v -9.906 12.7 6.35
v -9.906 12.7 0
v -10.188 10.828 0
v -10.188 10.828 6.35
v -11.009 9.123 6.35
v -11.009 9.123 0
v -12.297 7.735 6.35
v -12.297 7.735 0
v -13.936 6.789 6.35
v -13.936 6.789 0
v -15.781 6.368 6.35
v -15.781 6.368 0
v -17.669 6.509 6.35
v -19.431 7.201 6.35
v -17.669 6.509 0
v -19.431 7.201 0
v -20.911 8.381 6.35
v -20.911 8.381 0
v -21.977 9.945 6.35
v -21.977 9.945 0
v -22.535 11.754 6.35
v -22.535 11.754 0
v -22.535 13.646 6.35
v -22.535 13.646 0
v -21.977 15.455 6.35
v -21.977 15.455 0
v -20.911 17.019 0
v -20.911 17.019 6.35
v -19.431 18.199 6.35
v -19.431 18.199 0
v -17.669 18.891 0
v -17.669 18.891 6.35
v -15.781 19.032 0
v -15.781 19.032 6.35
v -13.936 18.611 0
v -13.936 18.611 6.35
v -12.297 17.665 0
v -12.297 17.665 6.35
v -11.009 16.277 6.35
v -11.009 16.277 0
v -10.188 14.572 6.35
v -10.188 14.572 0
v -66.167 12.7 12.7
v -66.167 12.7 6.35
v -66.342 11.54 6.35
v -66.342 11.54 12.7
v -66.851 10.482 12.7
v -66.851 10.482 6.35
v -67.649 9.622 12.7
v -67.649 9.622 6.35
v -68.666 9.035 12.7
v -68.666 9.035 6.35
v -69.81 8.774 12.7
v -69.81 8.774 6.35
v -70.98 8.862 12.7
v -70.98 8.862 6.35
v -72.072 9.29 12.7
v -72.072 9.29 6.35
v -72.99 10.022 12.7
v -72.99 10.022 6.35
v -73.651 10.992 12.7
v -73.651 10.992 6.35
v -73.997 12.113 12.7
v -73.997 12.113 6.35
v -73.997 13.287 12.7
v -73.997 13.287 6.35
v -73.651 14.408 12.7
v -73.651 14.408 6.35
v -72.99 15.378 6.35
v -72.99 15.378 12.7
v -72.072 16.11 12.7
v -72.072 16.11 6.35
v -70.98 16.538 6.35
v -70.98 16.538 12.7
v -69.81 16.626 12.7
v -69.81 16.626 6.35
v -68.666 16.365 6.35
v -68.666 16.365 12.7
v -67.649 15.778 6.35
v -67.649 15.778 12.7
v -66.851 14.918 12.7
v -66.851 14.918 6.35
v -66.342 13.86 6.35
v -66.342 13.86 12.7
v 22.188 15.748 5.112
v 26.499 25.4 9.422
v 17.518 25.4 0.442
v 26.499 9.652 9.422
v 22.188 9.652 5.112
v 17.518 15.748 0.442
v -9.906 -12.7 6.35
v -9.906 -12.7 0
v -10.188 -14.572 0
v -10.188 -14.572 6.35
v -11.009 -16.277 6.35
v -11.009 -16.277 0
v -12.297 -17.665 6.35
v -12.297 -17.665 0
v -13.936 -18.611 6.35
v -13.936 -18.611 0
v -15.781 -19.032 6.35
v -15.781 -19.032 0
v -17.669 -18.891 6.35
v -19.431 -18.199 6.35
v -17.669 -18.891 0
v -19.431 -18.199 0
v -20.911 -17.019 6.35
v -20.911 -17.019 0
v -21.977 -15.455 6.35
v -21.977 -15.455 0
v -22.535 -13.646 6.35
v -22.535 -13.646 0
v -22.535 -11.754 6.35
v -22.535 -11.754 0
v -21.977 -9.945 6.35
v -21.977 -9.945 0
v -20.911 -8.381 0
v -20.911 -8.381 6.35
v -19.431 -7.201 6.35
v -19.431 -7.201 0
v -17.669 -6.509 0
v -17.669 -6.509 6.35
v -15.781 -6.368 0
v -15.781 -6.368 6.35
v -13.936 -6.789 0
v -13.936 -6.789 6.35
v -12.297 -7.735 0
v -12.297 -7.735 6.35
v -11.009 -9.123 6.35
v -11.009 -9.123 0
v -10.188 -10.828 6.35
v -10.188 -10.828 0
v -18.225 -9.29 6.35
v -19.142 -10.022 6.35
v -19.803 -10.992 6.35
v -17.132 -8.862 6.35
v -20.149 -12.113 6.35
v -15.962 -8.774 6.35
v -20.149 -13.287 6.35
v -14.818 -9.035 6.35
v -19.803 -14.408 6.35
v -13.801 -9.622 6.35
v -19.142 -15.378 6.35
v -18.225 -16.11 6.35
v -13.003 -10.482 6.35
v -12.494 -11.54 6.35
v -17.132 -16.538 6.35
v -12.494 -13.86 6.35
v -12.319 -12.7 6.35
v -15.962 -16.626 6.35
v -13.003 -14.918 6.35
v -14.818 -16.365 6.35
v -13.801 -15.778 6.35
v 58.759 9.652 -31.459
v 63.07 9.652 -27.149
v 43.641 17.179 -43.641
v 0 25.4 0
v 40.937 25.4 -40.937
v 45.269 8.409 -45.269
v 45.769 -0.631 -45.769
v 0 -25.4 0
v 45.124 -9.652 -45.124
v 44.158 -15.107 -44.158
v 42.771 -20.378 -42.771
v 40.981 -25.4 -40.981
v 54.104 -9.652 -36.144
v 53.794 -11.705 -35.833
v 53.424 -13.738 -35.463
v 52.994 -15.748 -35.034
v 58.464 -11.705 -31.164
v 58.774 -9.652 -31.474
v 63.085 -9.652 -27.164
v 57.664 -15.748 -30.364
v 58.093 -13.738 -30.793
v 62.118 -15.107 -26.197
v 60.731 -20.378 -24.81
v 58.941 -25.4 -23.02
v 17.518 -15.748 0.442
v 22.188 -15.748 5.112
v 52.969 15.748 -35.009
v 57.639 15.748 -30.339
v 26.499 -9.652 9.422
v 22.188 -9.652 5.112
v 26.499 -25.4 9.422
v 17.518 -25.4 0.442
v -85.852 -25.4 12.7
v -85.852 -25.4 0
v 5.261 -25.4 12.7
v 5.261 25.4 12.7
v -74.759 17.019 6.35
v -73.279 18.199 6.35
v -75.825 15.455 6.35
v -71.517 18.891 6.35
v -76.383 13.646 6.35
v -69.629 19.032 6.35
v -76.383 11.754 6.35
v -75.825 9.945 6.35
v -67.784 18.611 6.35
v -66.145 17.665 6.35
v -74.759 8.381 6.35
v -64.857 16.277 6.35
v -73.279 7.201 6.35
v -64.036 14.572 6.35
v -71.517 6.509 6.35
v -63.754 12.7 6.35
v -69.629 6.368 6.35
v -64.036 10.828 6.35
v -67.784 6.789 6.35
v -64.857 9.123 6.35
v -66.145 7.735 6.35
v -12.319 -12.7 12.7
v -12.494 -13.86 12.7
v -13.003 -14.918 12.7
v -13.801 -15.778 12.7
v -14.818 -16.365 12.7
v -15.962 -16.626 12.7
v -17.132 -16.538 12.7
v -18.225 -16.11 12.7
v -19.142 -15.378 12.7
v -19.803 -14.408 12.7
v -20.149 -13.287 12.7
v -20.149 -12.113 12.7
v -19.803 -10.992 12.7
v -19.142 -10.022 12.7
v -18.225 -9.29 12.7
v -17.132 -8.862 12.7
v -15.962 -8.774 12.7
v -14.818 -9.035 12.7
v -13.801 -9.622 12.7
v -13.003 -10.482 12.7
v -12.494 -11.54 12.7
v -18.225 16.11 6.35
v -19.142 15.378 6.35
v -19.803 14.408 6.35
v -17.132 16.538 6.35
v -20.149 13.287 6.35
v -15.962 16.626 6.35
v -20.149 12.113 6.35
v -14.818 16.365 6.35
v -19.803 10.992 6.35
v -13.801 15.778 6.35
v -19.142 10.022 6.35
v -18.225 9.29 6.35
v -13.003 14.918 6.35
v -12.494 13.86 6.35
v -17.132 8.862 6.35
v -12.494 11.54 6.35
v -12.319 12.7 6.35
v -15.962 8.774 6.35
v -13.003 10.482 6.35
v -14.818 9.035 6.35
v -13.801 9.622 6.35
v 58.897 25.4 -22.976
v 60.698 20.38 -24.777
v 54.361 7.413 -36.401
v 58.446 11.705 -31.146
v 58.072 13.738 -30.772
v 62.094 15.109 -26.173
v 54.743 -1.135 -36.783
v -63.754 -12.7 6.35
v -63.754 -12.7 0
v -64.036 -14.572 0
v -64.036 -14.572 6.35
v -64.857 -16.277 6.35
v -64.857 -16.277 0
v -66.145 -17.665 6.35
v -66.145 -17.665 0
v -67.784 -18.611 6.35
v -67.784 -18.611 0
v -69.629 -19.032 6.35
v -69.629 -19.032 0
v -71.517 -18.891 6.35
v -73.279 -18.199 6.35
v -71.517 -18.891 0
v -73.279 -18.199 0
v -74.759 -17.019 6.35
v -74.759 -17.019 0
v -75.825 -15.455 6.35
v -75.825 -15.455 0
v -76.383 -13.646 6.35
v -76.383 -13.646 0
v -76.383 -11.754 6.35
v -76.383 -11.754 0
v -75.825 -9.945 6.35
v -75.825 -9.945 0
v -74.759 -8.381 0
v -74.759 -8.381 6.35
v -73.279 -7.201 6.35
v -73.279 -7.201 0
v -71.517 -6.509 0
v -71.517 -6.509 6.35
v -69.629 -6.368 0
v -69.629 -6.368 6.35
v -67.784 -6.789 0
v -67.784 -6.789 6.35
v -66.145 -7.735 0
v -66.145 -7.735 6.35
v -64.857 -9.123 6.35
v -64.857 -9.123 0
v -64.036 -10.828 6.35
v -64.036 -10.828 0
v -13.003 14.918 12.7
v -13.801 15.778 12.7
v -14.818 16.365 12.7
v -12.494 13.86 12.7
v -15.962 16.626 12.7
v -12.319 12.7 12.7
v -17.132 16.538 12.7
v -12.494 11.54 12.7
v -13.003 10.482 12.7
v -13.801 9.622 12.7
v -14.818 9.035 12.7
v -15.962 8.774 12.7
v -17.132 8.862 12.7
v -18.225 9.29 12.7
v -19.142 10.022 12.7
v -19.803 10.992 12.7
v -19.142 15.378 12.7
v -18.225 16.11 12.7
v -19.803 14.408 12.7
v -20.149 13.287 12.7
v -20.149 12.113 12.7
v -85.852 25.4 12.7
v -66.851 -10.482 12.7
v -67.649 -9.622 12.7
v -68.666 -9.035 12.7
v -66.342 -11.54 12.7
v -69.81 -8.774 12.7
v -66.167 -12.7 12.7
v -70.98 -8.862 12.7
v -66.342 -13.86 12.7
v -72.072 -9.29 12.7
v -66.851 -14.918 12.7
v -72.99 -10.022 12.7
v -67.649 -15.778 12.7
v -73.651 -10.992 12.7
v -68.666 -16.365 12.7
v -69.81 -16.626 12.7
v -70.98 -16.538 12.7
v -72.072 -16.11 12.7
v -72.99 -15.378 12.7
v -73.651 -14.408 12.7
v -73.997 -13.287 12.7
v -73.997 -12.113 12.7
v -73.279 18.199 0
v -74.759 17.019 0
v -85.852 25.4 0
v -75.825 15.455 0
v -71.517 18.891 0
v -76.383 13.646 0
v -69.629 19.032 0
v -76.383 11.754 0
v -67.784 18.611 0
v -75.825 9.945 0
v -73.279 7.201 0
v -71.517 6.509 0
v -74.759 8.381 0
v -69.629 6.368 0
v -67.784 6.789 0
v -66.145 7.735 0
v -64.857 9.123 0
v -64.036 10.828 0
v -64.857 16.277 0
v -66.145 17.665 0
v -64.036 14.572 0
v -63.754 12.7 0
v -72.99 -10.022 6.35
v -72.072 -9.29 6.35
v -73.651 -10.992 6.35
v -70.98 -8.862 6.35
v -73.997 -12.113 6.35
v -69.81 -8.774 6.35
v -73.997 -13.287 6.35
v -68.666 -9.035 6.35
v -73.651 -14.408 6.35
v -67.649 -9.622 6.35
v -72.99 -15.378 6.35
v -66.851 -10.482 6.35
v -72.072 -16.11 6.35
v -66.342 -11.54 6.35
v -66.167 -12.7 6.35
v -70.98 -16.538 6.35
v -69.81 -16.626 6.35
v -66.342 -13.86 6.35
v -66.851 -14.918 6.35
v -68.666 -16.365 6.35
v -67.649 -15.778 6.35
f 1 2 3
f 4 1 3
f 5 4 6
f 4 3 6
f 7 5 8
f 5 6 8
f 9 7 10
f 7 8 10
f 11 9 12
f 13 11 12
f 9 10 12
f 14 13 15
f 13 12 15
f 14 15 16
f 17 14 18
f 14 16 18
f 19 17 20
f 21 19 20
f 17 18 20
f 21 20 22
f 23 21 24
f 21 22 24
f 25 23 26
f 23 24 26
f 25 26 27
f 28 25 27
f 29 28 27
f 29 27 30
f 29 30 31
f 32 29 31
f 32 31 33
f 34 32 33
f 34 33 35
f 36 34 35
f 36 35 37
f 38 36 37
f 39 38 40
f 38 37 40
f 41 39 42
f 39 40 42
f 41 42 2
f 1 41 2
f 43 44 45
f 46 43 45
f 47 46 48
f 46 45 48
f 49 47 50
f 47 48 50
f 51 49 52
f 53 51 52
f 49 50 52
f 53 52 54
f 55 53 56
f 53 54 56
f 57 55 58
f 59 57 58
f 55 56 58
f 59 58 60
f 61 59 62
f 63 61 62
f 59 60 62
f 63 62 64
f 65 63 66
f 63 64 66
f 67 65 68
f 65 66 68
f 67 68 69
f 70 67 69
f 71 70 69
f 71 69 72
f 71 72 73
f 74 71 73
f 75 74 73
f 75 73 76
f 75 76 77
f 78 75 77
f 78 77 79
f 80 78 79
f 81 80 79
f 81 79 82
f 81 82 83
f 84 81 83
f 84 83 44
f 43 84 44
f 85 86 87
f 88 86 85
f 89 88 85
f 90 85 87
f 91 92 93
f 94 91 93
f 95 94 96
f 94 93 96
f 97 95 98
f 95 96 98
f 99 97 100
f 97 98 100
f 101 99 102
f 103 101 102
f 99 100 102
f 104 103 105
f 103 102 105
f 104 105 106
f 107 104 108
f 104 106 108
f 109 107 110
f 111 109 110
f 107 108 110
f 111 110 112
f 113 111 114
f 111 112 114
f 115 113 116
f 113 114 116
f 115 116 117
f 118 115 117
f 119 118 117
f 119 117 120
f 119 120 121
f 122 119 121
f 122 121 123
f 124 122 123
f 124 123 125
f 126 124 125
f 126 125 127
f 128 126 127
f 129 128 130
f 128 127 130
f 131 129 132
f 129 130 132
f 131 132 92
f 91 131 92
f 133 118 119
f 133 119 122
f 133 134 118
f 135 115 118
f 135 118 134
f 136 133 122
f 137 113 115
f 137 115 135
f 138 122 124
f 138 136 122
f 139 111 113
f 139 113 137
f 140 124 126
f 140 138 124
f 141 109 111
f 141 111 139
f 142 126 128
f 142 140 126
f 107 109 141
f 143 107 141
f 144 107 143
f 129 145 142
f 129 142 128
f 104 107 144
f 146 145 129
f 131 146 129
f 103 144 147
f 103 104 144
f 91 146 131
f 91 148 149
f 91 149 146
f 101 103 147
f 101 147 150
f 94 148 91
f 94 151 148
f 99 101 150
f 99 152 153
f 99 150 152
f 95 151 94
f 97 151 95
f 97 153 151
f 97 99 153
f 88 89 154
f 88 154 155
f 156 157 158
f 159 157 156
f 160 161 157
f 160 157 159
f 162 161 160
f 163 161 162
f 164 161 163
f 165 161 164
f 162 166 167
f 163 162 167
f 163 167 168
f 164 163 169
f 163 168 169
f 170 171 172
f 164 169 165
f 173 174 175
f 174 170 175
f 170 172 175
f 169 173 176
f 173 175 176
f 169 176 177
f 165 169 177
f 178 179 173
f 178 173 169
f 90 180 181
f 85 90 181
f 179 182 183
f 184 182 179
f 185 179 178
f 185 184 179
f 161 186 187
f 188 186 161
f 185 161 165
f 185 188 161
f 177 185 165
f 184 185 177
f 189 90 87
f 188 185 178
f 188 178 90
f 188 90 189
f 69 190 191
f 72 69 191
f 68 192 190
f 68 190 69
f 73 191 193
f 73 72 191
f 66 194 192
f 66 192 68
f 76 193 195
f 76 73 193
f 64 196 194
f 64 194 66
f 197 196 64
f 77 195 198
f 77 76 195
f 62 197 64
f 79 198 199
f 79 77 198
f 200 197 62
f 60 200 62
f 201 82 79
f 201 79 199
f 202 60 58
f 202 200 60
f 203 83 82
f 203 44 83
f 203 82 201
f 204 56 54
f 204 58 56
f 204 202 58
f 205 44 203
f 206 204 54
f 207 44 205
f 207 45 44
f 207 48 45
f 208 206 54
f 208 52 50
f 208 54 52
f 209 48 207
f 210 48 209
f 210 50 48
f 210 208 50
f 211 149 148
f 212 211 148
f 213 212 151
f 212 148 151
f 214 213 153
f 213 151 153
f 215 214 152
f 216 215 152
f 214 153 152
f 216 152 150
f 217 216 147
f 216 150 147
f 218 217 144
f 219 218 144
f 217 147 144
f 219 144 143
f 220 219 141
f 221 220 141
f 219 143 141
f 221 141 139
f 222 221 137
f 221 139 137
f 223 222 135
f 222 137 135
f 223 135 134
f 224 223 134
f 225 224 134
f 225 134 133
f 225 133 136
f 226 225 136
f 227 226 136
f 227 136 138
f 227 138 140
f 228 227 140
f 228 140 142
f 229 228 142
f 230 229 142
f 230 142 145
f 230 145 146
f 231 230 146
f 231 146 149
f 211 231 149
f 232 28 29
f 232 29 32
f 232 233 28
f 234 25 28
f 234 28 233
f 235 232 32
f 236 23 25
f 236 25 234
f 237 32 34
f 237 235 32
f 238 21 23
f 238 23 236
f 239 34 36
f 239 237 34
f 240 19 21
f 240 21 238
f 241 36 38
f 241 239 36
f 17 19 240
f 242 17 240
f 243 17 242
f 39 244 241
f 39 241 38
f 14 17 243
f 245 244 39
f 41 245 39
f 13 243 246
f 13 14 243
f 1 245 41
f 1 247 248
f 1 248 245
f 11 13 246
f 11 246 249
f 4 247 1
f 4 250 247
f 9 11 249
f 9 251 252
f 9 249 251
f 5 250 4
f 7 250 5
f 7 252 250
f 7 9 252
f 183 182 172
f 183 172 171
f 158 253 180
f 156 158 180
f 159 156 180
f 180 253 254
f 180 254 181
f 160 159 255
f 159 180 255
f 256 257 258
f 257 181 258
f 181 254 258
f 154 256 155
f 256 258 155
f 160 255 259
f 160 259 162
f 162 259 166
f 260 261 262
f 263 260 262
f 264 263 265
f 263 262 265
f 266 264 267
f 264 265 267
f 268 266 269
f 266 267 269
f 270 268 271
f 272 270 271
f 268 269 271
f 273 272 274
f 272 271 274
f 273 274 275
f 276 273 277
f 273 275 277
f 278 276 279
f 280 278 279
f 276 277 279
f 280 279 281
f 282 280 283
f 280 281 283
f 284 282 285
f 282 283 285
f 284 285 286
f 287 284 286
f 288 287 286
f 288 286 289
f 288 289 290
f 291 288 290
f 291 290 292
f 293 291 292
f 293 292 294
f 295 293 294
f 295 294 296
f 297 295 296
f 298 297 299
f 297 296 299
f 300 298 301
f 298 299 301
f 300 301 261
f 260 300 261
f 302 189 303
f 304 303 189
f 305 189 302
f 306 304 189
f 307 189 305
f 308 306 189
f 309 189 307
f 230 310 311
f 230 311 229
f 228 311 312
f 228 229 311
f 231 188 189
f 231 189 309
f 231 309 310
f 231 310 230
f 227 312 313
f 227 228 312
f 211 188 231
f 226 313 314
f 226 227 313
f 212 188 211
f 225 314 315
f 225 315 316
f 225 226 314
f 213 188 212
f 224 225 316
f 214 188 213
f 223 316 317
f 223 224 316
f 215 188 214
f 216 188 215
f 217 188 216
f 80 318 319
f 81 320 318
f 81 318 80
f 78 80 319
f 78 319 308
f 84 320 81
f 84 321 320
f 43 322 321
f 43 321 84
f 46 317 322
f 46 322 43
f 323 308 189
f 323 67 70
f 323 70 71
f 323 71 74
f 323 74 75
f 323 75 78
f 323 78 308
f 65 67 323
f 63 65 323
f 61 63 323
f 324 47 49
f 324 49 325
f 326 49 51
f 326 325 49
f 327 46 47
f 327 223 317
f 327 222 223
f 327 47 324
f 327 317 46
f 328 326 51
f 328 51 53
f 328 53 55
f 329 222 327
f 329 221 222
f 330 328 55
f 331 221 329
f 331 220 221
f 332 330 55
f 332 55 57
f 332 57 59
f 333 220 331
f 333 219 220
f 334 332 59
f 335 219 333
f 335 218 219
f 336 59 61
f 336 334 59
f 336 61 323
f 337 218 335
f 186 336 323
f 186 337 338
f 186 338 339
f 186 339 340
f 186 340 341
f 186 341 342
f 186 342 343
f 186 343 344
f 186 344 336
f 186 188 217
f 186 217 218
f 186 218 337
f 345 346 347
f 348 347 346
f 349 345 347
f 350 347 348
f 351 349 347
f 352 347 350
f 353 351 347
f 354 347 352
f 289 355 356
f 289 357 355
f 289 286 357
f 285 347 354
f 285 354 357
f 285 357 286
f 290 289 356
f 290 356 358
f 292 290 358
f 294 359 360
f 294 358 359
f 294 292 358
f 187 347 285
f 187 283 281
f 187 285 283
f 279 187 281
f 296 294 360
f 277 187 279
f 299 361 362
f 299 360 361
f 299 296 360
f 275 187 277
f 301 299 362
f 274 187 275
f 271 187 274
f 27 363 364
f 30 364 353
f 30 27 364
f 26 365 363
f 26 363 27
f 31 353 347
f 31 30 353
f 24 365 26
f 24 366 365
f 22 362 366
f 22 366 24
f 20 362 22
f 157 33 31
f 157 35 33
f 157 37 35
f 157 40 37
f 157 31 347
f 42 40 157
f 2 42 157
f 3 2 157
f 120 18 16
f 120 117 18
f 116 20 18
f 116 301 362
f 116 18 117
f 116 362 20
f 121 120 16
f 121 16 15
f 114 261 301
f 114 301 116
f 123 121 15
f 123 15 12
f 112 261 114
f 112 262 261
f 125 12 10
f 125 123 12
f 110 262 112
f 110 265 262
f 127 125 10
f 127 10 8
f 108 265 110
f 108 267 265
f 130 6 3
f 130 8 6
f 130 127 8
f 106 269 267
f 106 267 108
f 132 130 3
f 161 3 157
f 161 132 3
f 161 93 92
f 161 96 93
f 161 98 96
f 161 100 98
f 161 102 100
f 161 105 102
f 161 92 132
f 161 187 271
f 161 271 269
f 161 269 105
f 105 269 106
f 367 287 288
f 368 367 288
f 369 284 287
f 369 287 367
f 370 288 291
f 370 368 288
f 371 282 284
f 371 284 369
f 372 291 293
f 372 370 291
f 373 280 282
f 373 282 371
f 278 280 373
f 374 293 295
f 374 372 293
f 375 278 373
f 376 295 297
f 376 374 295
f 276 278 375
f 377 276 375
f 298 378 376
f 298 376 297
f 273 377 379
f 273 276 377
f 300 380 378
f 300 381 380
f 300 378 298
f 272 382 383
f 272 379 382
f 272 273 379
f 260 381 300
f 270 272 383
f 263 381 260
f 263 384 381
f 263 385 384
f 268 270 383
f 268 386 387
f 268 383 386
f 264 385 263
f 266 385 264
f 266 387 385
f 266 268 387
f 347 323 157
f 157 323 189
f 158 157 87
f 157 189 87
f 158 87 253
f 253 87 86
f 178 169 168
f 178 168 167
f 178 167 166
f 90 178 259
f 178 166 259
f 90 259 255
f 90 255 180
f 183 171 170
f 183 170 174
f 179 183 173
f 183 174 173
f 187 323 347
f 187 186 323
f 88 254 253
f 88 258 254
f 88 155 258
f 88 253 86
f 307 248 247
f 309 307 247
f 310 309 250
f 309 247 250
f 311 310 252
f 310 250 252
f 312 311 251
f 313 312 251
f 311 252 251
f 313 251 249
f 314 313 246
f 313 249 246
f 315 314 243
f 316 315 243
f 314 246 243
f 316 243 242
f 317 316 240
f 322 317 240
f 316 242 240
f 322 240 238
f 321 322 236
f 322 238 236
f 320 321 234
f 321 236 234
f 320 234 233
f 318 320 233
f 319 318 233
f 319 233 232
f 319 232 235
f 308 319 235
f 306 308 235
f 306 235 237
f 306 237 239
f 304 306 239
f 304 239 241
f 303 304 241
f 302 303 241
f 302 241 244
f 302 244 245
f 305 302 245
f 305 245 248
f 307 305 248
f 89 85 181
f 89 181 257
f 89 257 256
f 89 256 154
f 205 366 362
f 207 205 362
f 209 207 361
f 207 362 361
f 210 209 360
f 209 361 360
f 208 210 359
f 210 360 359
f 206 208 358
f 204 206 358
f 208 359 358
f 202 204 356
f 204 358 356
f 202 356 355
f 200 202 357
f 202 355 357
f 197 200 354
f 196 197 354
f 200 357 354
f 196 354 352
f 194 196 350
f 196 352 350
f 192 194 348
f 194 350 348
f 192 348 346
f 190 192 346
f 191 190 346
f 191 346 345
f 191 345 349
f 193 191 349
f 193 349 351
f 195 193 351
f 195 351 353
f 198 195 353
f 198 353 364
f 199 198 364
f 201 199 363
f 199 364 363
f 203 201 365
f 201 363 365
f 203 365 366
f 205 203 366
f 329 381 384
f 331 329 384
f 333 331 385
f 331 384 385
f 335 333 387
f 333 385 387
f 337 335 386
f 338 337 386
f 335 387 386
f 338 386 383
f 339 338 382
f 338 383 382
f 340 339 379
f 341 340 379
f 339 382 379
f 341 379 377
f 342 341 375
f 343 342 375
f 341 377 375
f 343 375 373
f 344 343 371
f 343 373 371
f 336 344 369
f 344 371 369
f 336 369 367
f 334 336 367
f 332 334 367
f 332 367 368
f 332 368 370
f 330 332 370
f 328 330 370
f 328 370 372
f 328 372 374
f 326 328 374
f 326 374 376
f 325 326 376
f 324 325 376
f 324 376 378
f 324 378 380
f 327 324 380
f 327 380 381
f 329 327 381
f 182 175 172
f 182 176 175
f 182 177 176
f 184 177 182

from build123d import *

# Parameters (mm, degrees)
F1_DEPTH = 25.4
F2_R     = 6.35
F3_DEPTH = 6.35
F4_R     = 3.937
F5_DEPTH = 25.4
F7_DEPTH = 52.7686600304
F9_DEPTH = 25.4


with BuildPart() as f1:
    # F0 (on Front) → F1 (new body, symmetric)
    with BuildSketch(Plane.XZ):
        Polygon((-85.852, 12.7), (-85.852, 0), (0, 0), (45.8512699094, -45.8512699094), (54.8315260304, -36.8710137883), (17.5184486888, 0.4420635534), (5.2605122421, 12.7), align=None)
        Polygon((26.4987048099, 9.4223196744), (17.5184486888, 0.4420635534), (54.8315260304, -36.8710137883), (63.8117821515, -27.8907576672), align=None)
    extrude(amount=F1_DEPTH, both=True)

    # F2 (on face) → F3 (cut)
    with BuildSketch(Plane(origin=(0, 0, 0), x_dir=(1, 0, 0), z_dir=(0, 0, -1))):
        with Locations((-70.104, 12.7)):
            Circle(F2_R)
        with Locations((-16.256, 12.7)):
            Circle(F2_R)
        with Locations((-16.256, -12.7)):
            Circle(F2_R)
        with Locations((-70.104, -12.7)):
            Circle(F2_R)
    extrude(amount=-F3_DEPTH, mode=Mode.SUBTRACT)

    # F4 (on face) → F5 (cut)
    with BuildSketch(Plane(origin=(0, 0, 0), x_dir=(1, 0, 0), z_dir=(0, 0, -1))):
        with Locations((-16.256, -12.7)):
            Circle(F4_R)
        with Locations((-16.256, 12.7)):
            Circle(F4_R)
        with Locations((-70.104, 12.7)):
            Circle(F4_R)
        with Locations((-70.104, -12.7)):
            Circle(F4_R)
    extrude(amount=-F5_DEPTH, mode=Mode.SUBTRACT)

    # F6 (on face) → F7 (cut, through all)
    with BuildSketch(Plane(origin=(45.8512699094, 0, -45.8512699094), x_dir=(0, 1, 0), z_dir=(0.7071067812, 0, -0.7071067812))):
        Polygon((9.652, 25.4), (-9.652, 25.4), (-9.652, 19.304), (-15.748, 19.304), (-15.748, 12.7), (15.748, 12.7), (15.748, 19.304), (9.652, 19.304), align=None)
    extrude(amount=-F7_DEPTH, mode=Mode.SUBTRACT)

    # F8 (on face) → F9 (cut, through all)
    with BuildSketch(Plane(origin=(17.9605122421, 0, 17.9605122421), x_dir=(0, 1, 0), z_dir=(0.7071067812, 0, 0.7071067812))):
        with BuildLine():
            ThreePointArc((-9.652, -63.8151974917), (-17.7699630745, -61.5408606446), (-25.4, -57.9552687705))
            Line((-25.4, -57.9552687705), (-25.4, -64.8434877579))
            Line((-25.4, -64.8434877579), (-9.652, -64.8434877579))
            Line((-9.652, -64.8434877579), (-9.652, -63.8151974917))
        make_face()
        with BuildLine():
            ThreePointArc((25.4, -57.89321661), (8.408914861, -64.0203496104), (-9.652, -63.8151974917))
            Line((-9.652, -63.8151974917), (-9.652, -64.8434877579))
            Line((-9.652, -64.8434877579), (1.0093030718, -64.8434877579))
            Line((1.0093030718, -64.8434877579), (25.4, -64.8434877579))
            Line((25.4, -64.8434877579), (25.4, -57.89321661))
        make_face()
    extrude(amount=-F9_DEPTH, mode=Mode.SUBTRACT)


solid = f1.part
